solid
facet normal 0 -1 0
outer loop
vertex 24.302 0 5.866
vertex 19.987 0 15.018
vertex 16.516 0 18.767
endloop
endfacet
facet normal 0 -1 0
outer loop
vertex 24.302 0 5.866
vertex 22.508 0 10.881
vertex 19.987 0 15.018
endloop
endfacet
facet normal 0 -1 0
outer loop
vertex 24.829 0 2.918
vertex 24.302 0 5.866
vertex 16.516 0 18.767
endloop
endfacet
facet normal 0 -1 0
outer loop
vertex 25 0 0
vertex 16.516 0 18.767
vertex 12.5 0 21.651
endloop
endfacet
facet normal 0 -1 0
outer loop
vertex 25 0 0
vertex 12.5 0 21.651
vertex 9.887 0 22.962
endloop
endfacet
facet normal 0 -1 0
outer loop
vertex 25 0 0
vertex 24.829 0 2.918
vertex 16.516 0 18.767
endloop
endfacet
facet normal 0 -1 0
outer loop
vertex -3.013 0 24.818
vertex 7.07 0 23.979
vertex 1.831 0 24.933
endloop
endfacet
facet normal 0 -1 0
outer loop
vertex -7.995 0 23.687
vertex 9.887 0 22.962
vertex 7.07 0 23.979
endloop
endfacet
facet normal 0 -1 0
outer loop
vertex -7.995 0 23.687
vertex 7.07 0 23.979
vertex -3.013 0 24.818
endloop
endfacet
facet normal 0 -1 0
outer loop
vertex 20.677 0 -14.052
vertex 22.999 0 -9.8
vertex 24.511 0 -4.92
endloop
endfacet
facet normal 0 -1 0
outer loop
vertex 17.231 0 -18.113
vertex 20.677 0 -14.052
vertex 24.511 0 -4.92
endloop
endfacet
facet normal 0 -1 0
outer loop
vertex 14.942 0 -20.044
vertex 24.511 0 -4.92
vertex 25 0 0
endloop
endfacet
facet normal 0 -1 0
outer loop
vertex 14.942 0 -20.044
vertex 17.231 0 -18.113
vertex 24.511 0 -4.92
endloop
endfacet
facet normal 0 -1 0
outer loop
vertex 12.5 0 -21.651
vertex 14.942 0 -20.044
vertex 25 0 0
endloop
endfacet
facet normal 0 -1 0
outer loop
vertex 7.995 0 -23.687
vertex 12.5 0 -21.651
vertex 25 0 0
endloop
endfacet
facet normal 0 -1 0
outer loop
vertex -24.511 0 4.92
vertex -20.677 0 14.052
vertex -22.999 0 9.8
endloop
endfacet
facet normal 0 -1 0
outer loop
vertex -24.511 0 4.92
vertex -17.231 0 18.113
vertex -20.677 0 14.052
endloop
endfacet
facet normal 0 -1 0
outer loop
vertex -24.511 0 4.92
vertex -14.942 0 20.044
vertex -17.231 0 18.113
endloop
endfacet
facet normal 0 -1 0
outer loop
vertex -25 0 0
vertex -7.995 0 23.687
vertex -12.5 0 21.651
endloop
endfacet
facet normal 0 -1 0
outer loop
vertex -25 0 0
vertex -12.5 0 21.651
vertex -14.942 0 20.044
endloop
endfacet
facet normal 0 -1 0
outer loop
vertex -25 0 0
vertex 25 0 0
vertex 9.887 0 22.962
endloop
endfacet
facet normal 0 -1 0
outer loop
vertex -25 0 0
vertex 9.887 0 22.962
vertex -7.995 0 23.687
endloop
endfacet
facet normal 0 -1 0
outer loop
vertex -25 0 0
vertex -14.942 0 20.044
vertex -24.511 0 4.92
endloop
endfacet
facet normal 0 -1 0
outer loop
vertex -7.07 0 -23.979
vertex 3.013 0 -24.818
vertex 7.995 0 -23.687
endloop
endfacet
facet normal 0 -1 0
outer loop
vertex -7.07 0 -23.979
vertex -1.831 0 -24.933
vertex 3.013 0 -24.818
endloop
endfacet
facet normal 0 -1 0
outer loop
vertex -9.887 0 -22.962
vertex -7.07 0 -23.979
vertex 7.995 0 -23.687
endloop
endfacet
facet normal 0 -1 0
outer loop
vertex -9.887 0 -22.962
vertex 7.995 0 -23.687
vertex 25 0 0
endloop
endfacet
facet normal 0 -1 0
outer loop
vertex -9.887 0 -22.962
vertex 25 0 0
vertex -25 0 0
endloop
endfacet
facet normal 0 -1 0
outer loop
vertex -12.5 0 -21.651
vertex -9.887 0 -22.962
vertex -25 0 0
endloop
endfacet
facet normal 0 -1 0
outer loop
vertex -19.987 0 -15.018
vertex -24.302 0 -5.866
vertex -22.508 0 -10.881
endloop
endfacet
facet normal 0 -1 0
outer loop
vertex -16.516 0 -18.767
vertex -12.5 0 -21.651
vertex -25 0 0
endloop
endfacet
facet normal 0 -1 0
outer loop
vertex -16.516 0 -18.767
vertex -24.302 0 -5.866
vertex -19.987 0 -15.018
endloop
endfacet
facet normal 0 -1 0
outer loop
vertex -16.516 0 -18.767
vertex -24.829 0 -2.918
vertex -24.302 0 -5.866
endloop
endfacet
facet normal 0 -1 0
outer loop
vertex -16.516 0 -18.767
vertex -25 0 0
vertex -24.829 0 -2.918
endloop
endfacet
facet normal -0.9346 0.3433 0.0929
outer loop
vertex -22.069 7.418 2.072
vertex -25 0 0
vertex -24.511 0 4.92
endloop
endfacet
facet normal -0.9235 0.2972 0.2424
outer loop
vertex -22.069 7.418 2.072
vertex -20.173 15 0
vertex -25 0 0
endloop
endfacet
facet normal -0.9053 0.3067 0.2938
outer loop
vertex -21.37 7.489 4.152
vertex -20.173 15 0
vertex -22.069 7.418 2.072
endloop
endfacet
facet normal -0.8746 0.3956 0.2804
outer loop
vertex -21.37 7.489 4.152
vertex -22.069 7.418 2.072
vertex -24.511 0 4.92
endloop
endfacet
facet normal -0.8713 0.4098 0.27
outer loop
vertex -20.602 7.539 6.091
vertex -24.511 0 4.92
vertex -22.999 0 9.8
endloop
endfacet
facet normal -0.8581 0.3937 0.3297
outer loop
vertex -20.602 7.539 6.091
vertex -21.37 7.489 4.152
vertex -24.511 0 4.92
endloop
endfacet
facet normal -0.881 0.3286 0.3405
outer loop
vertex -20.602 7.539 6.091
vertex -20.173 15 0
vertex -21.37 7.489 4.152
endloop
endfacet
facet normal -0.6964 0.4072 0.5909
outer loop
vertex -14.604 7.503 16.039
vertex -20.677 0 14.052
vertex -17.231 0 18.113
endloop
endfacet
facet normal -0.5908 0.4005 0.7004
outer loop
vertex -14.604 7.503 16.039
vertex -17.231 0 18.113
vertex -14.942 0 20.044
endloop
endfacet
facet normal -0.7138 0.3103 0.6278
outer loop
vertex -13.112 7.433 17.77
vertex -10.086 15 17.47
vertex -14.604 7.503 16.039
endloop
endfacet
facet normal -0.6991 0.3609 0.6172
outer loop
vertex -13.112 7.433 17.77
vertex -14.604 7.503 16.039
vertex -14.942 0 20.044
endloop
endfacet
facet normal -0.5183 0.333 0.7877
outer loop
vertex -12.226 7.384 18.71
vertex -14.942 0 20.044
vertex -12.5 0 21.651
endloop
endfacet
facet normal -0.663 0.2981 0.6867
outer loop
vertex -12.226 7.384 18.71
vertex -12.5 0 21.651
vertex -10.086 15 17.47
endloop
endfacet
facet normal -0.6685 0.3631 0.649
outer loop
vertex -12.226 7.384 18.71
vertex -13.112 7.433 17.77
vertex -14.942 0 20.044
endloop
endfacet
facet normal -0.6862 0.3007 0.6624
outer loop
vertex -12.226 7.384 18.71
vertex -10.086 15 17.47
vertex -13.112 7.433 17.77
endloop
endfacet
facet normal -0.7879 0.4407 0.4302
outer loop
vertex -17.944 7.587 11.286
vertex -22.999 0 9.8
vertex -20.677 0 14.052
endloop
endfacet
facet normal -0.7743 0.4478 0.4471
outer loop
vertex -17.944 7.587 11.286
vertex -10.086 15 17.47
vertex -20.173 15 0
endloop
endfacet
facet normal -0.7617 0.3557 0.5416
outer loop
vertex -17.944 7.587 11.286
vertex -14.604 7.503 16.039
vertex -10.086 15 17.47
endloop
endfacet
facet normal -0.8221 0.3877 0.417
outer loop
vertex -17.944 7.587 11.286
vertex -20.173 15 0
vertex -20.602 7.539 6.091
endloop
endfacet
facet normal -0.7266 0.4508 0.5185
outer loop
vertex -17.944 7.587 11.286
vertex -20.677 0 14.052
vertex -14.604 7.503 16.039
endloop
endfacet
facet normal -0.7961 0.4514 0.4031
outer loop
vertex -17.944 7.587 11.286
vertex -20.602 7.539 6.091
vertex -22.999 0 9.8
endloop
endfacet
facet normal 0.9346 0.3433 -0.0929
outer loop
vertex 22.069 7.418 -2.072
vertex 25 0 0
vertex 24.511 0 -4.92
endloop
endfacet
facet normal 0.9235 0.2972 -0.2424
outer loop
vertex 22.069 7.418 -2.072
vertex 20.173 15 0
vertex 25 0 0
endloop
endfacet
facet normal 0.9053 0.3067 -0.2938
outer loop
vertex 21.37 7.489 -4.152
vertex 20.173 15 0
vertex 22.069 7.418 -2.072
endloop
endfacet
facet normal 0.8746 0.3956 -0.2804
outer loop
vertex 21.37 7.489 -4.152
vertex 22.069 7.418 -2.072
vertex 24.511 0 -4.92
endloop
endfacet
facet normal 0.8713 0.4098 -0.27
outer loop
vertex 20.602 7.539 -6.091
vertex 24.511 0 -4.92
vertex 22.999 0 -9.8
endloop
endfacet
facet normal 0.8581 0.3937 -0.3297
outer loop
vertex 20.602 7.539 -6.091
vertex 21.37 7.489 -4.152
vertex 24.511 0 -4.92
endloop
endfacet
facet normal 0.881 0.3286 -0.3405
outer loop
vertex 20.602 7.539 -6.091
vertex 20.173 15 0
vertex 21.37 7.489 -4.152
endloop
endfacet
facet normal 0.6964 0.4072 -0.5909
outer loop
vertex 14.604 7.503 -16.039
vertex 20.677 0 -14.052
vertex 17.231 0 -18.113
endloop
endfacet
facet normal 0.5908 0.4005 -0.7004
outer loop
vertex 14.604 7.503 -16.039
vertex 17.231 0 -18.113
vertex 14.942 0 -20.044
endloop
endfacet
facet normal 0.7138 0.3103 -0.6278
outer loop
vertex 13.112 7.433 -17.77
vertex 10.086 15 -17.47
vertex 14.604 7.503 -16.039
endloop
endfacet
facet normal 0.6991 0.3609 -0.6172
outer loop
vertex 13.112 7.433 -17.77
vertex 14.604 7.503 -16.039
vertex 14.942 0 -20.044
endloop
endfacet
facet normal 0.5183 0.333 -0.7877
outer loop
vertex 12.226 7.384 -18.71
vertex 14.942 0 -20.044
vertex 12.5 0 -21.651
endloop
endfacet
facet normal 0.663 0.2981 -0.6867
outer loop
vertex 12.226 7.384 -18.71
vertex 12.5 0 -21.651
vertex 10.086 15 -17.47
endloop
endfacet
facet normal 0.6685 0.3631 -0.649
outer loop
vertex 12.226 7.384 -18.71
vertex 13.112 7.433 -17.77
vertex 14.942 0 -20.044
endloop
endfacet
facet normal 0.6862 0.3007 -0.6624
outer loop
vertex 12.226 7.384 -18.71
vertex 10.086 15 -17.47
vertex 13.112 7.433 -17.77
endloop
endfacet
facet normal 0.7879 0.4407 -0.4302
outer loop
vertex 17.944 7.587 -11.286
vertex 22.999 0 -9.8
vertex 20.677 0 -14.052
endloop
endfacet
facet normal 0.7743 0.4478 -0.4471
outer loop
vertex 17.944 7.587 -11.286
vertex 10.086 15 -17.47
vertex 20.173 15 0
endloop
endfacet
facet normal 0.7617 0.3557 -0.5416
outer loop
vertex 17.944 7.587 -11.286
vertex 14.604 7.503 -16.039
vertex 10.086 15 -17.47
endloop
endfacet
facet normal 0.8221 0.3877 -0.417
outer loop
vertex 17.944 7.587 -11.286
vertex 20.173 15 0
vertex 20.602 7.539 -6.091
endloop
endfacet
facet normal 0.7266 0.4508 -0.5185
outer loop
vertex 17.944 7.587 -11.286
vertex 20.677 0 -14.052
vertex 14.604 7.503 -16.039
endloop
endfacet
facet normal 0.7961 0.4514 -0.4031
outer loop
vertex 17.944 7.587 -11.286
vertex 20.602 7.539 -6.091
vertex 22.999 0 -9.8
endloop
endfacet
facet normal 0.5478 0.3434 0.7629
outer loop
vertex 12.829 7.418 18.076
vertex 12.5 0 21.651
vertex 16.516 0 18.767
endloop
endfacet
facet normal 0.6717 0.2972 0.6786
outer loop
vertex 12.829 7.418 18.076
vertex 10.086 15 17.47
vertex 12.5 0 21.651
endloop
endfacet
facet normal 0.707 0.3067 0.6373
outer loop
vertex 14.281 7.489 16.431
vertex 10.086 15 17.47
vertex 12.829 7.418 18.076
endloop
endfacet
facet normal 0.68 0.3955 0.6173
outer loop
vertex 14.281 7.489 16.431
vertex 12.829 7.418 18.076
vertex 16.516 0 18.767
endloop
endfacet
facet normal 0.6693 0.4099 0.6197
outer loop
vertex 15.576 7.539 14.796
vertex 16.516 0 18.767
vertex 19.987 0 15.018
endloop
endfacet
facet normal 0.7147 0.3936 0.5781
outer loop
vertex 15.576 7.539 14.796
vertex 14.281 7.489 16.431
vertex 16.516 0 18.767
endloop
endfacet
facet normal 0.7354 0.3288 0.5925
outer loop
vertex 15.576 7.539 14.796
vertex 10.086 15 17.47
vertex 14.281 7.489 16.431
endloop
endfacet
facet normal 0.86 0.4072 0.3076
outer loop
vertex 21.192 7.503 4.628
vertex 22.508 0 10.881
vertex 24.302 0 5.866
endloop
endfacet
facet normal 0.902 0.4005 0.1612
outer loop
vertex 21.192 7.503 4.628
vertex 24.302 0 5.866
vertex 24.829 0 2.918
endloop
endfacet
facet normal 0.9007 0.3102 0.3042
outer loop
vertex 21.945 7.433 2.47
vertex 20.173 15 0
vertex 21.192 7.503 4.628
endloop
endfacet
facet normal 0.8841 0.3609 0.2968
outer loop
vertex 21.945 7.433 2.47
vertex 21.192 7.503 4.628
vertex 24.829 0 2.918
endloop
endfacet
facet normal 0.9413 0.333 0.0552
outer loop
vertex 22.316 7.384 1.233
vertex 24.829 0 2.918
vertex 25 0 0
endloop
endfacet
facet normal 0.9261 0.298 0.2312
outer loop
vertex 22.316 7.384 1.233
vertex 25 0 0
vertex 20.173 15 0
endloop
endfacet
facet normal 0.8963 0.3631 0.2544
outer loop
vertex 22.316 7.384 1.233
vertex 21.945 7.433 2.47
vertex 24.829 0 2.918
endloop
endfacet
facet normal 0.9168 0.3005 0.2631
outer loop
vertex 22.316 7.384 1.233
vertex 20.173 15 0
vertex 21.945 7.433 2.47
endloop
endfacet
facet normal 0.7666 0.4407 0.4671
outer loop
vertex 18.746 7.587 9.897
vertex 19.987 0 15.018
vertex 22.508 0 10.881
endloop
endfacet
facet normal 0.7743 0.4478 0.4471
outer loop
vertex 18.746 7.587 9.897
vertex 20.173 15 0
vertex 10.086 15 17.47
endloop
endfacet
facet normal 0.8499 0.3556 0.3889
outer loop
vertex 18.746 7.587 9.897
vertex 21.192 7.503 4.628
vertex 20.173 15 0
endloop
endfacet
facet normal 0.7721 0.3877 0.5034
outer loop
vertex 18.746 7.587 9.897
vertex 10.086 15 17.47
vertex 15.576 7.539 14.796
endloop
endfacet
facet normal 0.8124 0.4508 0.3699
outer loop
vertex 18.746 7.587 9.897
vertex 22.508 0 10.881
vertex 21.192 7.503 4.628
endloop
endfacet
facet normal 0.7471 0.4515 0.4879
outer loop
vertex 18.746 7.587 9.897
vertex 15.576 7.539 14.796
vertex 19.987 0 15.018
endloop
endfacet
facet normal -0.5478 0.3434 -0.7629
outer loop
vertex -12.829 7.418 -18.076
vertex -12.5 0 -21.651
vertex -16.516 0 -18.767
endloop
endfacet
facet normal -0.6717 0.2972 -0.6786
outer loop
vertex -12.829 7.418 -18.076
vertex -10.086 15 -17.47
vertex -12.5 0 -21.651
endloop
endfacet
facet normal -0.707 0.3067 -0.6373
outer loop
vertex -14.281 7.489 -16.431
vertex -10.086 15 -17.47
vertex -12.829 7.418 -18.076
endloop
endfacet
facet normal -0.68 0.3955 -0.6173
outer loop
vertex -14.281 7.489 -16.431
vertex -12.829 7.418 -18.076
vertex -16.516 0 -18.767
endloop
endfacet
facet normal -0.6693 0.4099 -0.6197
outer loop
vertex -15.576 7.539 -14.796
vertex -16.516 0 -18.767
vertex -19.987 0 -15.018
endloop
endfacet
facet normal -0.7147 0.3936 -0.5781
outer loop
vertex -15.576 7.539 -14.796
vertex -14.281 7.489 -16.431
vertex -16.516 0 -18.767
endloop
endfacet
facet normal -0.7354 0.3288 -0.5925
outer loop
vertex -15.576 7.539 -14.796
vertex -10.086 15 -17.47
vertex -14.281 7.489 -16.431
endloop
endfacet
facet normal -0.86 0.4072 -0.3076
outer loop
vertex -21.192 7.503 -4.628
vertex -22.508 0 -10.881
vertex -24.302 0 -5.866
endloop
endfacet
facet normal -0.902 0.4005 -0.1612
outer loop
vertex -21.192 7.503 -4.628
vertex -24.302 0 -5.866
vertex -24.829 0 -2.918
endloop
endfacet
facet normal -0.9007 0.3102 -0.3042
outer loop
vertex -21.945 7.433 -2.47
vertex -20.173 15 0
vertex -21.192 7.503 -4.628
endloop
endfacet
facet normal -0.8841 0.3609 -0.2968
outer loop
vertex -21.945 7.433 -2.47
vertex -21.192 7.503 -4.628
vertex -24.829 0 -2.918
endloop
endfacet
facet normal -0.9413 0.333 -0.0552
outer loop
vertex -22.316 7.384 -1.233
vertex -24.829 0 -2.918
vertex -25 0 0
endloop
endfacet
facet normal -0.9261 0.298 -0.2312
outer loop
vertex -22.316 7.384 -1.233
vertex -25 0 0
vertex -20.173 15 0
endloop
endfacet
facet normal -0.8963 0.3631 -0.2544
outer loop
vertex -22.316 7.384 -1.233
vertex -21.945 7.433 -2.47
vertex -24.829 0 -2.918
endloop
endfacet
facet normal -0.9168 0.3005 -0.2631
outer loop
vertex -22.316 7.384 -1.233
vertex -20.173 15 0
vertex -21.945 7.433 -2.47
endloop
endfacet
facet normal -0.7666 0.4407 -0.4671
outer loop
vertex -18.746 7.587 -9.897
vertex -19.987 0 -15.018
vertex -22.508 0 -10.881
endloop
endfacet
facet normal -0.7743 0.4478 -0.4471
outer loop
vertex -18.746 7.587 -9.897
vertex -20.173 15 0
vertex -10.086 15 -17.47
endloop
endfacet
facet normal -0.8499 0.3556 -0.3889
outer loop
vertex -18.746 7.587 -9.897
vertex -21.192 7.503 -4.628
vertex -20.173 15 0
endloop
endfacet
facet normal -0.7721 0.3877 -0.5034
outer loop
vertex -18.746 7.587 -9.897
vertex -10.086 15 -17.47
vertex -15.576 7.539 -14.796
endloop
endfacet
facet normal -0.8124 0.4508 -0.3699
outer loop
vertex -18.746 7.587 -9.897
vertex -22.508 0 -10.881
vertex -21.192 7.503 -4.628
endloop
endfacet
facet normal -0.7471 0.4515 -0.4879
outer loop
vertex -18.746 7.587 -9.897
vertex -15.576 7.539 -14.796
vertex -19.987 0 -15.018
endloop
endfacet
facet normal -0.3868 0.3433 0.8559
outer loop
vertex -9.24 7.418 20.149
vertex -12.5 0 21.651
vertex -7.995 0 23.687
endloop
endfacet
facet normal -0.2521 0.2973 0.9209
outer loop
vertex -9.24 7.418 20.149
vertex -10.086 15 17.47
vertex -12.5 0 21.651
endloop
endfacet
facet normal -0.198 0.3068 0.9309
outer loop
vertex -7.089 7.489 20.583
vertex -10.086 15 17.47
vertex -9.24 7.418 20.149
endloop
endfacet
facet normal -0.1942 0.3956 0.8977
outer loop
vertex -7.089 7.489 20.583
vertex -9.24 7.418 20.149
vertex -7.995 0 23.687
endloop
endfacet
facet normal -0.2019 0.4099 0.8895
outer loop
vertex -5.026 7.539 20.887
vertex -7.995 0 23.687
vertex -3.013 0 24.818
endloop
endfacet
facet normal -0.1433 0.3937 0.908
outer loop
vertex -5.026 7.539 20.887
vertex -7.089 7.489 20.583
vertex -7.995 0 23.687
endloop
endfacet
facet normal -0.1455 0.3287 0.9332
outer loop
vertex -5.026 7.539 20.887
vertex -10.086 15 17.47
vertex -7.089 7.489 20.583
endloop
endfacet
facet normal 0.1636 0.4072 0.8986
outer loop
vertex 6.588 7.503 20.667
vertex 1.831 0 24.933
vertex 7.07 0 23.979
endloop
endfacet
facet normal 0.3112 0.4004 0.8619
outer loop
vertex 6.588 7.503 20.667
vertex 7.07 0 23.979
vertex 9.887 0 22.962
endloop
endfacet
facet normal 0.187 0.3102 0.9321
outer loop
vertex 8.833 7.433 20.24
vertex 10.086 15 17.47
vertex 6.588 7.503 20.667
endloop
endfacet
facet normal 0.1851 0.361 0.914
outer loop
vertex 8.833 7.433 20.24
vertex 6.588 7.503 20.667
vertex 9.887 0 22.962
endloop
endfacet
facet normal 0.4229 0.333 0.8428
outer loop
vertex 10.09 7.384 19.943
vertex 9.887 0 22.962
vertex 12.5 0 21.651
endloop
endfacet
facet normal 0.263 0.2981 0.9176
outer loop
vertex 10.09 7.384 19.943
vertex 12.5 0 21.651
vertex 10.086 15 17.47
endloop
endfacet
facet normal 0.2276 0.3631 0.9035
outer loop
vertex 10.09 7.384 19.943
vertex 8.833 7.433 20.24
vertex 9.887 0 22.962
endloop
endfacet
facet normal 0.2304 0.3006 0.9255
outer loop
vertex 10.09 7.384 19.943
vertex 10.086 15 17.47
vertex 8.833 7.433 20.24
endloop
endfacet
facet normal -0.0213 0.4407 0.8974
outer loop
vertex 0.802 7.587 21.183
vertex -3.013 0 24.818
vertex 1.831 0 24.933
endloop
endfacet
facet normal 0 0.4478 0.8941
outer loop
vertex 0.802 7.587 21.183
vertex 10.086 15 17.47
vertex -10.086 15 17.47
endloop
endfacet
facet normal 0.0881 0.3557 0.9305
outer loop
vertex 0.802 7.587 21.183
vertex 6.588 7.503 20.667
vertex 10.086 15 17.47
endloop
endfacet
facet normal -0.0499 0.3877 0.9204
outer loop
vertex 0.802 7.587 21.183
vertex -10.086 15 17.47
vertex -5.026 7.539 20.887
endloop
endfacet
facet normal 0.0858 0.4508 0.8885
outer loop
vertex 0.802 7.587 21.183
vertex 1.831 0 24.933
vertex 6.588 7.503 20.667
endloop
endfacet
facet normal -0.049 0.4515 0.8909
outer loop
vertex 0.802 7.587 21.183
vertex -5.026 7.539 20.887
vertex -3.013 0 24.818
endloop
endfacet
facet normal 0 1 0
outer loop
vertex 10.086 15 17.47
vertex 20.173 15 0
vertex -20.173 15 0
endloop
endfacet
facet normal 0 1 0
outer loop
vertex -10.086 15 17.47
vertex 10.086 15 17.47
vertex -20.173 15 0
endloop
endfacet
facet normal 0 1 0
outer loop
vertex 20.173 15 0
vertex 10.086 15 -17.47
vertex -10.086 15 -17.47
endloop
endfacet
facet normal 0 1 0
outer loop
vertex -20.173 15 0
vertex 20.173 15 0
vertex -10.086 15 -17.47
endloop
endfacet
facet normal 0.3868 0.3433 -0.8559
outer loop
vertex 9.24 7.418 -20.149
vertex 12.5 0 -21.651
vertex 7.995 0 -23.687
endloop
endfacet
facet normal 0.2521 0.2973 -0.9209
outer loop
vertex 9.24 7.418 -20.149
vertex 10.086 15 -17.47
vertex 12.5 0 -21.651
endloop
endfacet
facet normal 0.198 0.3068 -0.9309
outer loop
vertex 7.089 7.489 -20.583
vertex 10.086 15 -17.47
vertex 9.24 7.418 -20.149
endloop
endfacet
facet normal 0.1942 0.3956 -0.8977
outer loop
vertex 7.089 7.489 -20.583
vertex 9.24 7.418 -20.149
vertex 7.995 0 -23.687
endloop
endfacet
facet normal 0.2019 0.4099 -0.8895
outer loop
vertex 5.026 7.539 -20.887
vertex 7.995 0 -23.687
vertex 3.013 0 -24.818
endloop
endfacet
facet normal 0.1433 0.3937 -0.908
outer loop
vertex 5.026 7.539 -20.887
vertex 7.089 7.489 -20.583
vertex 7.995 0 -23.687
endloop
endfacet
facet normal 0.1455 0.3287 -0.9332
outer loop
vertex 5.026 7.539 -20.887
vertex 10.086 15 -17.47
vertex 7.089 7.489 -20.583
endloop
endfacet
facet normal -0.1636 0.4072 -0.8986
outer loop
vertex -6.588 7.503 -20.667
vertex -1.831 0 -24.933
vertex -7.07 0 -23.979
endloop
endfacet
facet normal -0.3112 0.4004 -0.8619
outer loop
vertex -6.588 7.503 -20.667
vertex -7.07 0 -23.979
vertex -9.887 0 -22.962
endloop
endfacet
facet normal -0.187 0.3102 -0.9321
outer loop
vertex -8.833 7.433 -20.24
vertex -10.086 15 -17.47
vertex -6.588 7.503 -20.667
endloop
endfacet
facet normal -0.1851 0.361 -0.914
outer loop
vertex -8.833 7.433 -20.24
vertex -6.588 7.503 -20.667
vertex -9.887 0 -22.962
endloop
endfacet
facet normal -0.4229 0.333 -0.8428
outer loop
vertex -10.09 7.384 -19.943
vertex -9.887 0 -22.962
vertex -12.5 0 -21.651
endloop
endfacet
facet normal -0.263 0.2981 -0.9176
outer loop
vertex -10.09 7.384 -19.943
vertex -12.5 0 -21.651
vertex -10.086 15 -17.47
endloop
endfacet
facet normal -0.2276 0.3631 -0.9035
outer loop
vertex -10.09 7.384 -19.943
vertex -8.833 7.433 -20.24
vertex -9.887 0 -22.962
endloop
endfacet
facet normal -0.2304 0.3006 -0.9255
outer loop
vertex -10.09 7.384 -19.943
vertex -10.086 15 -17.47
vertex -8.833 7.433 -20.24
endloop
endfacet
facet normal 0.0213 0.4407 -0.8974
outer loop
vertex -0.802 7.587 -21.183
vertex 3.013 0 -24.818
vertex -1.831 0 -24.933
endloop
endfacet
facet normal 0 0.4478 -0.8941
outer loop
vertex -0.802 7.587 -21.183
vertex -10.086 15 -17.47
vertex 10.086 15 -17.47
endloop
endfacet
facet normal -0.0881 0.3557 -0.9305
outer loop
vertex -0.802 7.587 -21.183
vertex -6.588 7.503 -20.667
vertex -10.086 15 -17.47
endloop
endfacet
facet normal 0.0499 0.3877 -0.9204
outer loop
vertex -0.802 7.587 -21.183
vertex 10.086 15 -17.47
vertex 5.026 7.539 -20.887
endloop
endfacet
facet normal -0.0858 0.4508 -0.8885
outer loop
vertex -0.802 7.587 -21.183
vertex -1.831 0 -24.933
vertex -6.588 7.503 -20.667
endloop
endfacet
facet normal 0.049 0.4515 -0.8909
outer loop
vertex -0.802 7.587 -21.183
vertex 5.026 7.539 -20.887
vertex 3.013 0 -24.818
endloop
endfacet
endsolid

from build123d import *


with BuildPart() as part:
    # Sketch1 for Loft1 → Loft1 section 0
    with BuildSketch(Plane(origin=(0, 0, 0), x_dir=(1, 0, 0), z_dir=(0, 1, 0))):
        with BuildLine():
            # circular arc as an exact rational Bezier (weights 1, cos(half-angle), 1)
            Bezier((25, 0), (25.000000001, 14.43375673), (12.5, 21.650635095), weights=[1, 0.866025404, 1])
            Bezier((12.5, 21.650635095), (0, 28.867513459), (-12.5, 21.650635095), weights=[1, 0.866025404, 1])
            Bezier((-12.5, 21.650635095), (-25.000000001, 14.43375673), (-25, 0), weights=[1, 0.866025404, 1])
            Bezier((-25, 0), (-25.000000001, -14.43375673), (-12.5, -21.650635095), weights=[1, 0.866025404, 1])
            Bezier((-12.5, -21.650635095), (0, -28.867513459), (12.5, -21.650635095), weights=[1, 0.866025404, 1])
            Bezier((12.5, -21.650635095), (25.000000001, -14.43375673), (25, 0), weights=[1, 0.866025404, 1])
        make_face()
    # Sketch2 → Loft1 section 1
    with BuildSketch(Plane(origin=(0, 15, 0), x_dir=(1, 0, 0), z_dir=(0, 1, 0))):
        Polygon((20.172526377, 0), (10.086263189, 17.469920301), (-10.086263189, 17.469920301), (-20.172526377, 0), (-10.086263189, -17.469920301), (10.086263189, -17.469920301), align=None)
    loft()


solid = part.part
